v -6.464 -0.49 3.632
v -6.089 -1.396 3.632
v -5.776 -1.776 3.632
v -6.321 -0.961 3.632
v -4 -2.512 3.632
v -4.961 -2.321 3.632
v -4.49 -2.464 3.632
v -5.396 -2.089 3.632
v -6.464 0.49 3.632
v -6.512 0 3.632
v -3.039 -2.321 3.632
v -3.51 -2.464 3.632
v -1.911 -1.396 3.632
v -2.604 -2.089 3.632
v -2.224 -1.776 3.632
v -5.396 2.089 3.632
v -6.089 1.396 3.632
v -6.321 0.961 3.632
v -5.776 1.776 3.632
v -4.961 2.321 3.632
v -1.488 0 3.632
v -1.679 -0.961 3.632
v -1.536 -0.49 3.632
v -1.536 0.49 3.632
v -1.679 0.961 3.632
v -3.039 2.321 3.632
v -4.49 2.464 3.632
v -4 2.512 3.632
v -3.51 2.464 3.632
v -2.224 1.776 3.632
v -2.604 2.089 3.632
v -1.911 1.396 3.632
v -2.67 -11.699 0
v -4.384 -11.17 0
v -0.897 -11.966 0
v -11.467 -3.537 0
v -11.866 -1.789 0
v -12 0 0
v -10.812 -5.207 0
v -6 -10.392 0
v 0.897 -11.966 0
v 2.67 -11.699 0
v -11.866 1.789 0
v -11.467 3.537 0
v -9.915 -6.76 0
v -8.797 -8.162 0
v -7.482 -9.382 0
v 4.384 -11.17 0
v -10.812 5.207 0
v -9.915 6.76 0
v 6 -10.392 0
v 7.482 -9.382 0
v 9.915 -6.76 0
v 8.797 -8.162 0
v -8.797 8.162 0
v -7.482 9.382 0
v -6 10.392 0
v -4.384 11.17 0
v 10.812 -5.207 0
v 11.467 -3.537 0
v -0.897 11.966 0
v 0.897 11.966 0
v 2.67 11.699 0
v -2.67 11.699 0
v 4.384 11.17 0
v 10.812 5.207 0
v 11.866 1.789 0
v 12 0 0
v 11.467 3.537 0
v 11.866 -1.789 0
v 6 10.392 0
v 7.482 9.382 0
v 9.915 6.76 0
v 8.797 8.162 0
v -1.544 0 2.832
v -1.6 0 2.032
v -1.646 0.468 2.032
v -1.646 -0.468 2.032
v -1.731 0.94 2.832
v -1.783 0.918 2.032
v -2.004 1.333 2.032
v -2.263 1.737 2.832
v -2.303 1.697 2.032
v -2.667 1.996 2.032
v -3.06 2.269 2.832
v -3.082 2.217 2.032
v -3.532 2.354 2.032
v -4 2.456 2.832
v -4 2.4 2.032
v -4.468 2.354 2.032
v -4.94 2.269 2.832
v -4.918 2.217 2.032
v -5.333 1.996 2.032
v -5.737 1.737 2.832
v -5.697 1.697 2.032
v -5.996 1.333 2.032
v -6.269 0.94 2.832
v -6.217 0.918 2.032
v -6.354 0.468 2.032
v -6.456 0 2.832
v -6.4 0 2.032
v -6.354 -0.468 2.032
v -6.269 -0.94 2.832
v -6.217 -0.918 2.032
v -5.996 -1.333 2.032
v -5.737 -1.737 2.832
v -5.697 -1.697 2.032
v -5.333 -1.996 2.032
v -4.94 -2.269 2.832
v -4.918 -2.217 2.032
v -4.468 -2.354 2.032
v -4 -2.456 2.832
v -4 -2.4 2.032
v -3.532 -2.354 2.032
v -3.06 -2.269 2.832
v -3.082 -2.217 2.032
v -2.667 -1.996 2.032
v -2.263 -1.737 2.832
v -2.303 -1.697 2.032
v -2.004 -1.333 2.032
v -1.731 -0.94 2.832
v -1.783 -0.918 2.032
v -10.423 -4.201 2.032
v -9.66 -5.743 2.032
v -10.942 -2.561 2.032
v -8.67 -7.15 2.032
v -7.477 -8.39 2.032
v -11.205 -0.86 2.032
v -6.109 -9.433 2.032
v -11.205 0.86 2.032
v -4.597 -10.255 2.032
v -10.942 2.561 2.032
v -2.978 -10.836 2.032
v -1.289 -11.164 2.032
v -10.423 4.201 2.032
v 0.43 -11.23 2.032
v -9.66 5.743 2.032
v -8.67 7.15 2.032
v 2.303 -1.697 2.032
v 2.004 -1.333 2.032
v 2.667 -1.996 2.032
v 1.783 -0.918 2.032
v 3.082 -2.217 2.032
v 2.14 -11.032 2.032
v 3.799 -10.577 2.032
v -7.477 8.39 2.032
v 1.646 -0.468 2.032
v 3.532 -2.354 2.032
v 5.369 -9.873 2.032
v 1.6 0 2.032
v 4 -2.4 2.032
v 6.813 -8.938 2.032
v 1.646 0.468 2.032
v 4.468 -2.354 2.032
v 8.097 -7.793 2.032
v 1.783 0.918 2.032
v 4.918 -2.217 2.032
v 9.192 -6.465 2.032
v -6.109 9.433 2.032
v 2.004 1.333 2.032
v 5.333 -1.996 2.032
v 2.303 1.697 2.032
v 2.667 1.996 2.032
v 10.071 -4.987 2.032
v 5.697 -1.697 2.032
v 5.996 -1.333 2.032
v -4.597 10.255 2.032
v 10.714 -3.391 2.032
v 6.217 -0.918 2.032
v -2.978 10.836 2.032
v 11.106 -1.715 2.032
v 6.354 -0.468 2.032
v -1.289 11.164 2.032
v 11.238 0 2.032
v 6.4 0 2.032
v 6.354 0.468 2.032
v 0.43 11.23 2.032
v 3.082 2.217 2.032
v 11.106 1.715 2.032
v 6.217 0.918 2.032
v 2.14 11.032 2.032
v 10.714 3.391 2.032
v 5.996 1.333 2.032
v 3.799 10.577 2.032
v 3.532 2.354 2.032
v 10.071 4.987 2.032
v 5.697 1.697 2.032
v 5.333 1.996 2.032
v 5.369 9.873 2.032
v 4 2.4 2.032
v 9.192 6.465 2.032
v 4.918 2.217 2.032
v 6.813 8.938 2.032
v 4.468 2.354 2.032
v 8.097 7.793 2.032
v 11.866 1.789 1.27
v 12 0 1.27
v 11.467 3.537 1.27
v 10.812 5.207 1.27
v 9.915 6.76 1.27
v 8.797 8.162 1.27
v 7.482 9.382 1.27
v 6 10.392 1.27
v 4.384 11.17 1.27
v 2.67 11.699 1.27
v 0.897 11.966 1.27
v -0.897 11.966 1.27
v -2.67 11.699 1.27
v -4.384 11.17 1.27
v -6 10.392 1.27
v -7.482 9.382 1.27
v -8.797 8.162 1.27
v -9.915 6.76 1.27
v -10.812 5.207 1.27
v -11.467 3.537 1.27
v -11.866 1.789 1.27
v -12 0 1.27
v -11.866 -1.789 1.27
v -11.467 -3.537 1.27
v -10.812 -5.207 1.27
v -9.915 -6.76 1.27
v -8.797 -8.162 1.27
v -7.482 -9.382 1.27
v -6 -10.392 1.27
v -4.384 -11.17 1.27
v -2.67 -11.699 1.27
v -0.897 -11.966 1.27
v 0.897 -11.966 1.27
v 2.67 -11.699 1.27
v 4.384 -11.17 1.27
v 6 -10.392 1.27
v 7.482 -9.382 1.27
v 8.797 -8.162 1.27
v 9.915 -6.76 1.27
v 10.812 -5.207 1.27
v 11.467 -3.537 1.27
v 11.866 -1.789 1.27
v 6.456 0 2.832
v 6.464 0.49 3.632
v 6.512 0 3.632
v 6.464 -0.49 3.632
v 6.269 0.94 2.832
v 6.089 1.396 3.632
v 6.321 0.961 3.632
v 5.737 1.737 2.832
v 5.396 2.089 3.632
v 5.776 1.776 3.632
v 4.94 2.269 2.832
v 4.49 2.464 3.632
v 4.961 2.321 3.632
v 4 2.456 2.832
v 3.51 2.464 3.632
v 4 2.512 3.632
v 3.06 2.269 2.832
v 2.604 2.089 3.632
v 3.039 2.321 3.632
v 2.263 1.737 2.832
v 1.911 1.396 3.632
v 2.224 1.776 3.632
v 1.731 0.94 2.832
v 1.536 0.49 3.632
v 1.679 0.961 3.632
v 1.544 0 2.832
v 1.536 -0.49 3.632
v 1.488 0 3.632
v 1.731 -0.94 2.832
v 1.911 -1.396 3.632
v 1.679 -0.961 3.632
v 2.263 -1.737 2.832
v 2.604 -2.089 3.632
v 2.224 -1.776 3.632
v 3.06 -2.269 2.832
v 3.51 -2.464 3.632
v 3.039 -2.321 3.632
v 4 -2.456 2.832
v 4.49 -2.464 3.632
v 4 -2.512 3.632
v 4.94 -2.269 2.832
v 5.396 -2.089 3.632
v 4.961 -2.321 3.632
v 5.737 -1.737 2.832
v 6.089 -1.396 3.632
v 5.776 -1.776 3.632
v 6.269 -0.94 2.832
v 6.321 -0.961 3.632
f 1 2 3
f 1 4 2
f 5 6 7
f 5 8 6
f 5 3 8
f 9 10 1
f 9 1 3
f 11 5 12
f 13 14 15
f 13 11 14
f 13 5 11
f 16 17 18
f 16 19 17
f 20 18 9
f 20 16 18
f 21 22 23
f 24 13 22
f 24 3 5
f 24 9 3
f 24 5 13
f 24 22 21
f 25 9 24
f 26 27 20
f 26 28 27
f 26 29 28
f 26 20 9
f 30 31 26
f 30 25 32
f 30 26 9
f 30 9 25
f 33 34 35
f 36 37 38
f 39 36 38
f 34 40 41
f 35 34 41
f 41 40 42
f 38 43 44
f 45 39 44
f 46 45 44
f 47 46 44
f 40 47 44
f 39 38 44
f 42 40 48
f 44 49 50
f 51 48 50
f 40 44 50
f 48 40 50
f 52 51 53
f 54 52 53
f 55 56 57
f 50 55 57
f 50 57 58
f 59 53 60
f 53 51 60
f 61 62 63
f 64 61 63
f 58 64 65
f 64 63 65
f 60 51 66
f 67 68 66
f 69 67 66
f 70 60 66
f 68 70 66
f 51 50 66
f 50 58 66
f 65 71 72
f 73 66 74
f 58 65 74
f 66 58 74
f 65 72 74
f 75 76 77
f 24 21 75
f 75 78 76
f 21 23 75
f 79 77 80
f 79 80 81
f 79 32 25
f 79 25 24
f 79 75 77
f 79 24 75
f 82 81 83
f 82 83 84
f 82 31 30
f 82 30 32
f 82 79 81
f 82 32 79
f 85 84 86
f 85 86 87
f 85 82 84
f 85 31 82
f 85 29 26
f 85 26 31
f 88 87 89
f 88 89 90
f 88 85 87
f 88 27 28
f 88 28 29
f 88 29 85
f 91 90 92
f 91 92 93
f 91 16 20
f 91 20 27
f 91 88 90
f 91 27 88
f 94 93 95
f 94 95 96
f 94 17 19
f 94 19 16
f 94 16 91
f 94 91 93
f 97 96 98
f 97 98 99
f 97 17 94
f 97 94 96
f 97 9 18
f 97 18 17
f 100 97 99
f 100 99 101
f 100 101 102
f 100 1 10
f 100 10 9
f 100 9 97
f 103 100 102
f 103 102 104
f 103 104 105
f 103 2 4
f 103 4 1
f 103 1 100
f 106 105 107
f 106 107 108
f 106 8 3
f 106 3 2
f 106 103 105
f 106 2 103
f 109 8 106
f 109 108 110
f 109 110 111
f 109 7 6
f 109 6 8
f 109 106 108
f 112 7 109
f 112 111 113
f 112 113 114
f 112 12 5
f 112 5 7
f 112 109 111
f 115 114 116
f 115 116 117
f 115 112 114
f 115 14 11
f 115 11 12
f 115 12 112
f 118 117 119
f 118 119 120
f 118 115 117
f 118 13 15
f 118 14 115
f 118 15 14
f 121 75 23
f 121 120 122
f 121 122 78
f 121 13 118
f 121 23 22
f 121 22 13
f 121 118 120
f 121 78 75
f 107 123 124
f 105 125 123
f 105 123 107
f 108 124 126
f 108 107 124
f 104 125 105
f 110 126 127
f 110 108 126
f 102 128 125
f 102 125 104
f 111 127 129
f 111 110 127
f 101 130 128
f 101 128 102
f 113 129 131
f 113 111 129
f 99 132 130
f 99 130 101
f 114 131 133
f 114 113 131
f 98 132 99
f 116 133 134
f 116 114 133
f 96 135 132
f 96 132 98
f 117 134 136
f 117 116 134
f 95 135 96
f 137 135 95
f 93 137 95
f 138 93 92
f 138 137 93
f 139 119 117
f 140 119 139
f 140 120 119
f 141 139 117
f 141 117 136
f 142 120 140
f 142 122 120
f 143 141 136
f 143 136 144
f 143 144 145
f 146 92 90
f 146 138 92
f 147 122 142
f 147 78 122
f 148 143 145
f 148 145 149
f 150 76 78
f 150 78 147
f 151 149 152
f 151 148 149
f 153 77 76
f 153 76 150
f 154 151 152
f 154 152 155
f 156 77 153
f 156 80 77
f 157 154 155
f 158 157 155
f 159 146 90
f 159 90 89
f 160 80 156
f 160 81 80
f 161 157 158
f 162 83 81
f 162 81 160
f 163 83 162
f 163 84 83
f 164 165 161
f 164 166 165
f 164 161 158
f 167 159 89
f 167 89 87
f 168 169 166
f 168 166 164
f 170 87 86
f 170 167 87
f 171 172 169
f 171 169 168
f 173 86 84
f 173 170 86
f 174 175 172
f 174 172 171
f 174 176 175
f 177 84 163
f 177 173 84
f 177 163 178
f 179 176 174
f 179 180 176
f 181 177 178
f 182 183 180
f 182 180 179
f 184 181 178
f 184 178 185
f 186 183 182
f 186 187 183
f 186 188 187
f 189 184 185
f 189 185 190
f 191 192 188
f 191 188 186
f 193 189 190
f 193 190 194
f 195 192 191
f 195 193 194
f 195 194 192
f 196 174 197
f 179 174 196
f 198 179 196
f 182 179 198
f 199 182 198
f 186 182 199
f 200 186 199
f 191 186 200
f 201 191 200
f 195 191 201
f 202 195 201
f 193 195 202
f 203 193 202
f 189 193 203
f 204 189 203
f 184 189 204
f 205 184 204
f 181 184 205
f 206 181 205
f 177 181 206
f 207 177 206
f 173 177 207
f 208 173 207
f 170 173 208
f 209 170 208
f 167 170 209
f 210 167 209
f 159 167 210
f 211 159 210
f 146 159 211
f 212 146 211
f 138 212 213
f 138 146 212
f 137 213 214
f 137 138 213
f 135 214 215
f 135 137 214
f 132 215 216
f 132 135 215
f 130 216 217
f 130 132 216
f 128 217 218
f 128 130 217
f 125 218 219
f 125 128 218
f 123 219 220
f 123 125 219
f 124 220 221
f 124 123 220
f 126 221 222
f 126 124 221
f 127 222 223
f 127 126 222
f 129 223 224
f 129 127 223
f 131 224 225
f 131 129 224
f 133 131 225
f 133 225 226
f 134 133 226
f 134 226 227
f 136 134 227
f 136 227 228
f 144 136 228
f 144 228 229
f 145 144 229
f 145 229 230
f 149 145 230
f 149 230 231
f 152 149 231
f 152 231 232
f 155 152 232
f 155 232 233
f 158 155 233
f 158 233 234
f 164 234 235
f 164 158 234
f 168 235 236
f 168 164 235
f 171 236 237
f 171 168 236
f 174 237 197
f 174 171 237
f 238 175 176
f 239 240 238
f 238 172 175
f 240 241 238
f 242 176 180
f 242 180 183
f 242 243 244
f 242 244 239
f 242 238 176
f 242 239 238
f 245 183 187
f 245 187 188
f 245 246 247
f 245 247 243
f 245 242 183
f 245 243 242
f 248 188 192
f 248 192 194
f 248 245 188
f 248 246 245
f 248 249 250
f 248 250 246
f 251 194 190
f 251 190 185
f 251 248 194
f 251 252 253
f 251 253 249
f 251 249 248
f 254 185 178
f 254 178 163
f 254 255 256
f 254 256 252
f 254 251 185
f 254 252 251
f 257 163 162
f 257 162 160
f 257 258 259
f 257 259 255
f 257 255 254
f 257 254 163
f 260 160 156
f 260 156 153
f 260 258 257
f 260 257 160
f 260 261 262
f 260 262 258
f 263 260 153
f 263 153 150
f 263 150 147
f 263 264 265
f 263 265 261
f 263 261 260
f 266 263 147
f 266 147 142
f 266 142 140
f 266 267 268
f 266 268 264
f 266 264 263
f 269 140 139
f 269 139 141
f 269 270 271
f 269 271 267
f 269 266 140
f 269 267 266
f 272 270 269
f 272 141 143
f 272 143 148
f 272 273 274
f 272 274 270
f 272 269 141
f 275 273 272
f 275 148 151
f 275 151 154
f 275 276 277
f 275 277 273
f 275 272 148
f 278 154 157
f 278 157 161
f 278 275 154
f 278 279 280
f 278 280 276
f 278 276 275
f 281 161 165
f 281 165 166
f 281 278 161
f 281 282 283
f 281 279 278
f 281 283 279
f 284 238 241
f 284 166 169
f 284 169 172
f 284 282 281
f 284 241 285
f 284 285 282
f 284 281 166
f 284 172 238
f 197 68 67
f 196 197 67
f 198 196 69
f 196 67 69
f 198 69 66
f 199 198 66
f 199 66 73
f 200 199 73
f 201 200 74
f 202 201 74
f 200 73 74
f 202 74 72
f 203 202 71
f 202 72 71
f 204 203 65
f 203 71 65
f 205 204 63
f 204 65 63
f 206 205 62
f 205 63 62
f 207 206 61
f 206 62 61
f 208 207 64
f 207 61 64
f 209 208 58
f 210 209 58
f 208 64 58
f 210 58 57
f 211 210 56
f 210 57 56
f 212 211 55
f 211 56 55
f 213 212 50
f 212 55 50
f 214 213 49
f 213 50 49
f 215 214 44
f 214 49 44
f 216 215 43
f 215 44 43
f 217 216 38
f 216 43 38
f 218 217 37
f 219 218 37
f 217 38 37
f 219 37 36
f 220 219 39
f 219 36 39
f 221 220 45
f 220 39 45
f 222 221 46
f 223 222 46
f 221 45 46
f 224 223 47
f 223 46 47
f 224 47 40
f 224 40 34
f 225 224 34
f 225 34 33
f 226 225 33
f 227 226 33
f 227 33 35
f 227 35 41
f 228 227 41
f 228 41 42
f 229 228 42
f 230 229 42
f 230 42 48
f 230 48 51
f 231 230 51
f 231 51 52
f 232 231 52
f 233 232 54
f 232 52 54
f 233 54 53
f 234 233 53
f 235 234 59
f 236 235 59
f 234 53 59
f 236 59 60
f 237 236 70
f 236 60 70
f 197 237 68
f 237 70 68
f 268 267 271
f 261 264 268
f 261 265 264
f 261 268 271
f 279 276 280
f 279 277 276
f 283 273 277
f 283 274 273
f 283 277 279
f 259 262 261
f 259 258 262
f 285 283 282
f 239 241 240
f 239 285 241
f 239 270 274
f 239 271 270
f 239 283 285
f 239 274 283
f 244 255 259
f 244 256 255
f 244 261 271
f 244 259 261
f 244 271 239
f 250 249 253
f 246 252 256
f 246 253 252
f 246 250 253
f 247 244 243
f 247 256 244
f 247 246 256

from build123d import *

# Parameters (mm, degrees)
F0_R     = 12
F1_DEPTH = 2.032
F2_SIZE  = 0.762
F3_R     = 2.4
F4_DEPTH = 1.6
F4_TAPER = -4


with BuildPart() as f1:
    # F0 (on Top) → F1 (new body)
    with BuildSketch(Plane.XY):
        Circle(F0_R)
    extrude(amount=F1_DEPTH)

    # F2
    f2_edges = [f1.edges().sort_by_distance(p)[0] for p in [
        (-12, 0, 2.032),
    ]]
    chamfer(f2_edges, length=F2_SIZE)

    # F3 (on face) → F4 (join)
    with BuildSketch(Plane.XY.offset(2.032)):
        with Locations((4, 0)):
            Circle(F3_R)
        with Locations((-4, 0)):
            Circle(F3_R)
    extrude(amount=F4_DEPTH, taper=F4_TAPER)


solid = f1.part
